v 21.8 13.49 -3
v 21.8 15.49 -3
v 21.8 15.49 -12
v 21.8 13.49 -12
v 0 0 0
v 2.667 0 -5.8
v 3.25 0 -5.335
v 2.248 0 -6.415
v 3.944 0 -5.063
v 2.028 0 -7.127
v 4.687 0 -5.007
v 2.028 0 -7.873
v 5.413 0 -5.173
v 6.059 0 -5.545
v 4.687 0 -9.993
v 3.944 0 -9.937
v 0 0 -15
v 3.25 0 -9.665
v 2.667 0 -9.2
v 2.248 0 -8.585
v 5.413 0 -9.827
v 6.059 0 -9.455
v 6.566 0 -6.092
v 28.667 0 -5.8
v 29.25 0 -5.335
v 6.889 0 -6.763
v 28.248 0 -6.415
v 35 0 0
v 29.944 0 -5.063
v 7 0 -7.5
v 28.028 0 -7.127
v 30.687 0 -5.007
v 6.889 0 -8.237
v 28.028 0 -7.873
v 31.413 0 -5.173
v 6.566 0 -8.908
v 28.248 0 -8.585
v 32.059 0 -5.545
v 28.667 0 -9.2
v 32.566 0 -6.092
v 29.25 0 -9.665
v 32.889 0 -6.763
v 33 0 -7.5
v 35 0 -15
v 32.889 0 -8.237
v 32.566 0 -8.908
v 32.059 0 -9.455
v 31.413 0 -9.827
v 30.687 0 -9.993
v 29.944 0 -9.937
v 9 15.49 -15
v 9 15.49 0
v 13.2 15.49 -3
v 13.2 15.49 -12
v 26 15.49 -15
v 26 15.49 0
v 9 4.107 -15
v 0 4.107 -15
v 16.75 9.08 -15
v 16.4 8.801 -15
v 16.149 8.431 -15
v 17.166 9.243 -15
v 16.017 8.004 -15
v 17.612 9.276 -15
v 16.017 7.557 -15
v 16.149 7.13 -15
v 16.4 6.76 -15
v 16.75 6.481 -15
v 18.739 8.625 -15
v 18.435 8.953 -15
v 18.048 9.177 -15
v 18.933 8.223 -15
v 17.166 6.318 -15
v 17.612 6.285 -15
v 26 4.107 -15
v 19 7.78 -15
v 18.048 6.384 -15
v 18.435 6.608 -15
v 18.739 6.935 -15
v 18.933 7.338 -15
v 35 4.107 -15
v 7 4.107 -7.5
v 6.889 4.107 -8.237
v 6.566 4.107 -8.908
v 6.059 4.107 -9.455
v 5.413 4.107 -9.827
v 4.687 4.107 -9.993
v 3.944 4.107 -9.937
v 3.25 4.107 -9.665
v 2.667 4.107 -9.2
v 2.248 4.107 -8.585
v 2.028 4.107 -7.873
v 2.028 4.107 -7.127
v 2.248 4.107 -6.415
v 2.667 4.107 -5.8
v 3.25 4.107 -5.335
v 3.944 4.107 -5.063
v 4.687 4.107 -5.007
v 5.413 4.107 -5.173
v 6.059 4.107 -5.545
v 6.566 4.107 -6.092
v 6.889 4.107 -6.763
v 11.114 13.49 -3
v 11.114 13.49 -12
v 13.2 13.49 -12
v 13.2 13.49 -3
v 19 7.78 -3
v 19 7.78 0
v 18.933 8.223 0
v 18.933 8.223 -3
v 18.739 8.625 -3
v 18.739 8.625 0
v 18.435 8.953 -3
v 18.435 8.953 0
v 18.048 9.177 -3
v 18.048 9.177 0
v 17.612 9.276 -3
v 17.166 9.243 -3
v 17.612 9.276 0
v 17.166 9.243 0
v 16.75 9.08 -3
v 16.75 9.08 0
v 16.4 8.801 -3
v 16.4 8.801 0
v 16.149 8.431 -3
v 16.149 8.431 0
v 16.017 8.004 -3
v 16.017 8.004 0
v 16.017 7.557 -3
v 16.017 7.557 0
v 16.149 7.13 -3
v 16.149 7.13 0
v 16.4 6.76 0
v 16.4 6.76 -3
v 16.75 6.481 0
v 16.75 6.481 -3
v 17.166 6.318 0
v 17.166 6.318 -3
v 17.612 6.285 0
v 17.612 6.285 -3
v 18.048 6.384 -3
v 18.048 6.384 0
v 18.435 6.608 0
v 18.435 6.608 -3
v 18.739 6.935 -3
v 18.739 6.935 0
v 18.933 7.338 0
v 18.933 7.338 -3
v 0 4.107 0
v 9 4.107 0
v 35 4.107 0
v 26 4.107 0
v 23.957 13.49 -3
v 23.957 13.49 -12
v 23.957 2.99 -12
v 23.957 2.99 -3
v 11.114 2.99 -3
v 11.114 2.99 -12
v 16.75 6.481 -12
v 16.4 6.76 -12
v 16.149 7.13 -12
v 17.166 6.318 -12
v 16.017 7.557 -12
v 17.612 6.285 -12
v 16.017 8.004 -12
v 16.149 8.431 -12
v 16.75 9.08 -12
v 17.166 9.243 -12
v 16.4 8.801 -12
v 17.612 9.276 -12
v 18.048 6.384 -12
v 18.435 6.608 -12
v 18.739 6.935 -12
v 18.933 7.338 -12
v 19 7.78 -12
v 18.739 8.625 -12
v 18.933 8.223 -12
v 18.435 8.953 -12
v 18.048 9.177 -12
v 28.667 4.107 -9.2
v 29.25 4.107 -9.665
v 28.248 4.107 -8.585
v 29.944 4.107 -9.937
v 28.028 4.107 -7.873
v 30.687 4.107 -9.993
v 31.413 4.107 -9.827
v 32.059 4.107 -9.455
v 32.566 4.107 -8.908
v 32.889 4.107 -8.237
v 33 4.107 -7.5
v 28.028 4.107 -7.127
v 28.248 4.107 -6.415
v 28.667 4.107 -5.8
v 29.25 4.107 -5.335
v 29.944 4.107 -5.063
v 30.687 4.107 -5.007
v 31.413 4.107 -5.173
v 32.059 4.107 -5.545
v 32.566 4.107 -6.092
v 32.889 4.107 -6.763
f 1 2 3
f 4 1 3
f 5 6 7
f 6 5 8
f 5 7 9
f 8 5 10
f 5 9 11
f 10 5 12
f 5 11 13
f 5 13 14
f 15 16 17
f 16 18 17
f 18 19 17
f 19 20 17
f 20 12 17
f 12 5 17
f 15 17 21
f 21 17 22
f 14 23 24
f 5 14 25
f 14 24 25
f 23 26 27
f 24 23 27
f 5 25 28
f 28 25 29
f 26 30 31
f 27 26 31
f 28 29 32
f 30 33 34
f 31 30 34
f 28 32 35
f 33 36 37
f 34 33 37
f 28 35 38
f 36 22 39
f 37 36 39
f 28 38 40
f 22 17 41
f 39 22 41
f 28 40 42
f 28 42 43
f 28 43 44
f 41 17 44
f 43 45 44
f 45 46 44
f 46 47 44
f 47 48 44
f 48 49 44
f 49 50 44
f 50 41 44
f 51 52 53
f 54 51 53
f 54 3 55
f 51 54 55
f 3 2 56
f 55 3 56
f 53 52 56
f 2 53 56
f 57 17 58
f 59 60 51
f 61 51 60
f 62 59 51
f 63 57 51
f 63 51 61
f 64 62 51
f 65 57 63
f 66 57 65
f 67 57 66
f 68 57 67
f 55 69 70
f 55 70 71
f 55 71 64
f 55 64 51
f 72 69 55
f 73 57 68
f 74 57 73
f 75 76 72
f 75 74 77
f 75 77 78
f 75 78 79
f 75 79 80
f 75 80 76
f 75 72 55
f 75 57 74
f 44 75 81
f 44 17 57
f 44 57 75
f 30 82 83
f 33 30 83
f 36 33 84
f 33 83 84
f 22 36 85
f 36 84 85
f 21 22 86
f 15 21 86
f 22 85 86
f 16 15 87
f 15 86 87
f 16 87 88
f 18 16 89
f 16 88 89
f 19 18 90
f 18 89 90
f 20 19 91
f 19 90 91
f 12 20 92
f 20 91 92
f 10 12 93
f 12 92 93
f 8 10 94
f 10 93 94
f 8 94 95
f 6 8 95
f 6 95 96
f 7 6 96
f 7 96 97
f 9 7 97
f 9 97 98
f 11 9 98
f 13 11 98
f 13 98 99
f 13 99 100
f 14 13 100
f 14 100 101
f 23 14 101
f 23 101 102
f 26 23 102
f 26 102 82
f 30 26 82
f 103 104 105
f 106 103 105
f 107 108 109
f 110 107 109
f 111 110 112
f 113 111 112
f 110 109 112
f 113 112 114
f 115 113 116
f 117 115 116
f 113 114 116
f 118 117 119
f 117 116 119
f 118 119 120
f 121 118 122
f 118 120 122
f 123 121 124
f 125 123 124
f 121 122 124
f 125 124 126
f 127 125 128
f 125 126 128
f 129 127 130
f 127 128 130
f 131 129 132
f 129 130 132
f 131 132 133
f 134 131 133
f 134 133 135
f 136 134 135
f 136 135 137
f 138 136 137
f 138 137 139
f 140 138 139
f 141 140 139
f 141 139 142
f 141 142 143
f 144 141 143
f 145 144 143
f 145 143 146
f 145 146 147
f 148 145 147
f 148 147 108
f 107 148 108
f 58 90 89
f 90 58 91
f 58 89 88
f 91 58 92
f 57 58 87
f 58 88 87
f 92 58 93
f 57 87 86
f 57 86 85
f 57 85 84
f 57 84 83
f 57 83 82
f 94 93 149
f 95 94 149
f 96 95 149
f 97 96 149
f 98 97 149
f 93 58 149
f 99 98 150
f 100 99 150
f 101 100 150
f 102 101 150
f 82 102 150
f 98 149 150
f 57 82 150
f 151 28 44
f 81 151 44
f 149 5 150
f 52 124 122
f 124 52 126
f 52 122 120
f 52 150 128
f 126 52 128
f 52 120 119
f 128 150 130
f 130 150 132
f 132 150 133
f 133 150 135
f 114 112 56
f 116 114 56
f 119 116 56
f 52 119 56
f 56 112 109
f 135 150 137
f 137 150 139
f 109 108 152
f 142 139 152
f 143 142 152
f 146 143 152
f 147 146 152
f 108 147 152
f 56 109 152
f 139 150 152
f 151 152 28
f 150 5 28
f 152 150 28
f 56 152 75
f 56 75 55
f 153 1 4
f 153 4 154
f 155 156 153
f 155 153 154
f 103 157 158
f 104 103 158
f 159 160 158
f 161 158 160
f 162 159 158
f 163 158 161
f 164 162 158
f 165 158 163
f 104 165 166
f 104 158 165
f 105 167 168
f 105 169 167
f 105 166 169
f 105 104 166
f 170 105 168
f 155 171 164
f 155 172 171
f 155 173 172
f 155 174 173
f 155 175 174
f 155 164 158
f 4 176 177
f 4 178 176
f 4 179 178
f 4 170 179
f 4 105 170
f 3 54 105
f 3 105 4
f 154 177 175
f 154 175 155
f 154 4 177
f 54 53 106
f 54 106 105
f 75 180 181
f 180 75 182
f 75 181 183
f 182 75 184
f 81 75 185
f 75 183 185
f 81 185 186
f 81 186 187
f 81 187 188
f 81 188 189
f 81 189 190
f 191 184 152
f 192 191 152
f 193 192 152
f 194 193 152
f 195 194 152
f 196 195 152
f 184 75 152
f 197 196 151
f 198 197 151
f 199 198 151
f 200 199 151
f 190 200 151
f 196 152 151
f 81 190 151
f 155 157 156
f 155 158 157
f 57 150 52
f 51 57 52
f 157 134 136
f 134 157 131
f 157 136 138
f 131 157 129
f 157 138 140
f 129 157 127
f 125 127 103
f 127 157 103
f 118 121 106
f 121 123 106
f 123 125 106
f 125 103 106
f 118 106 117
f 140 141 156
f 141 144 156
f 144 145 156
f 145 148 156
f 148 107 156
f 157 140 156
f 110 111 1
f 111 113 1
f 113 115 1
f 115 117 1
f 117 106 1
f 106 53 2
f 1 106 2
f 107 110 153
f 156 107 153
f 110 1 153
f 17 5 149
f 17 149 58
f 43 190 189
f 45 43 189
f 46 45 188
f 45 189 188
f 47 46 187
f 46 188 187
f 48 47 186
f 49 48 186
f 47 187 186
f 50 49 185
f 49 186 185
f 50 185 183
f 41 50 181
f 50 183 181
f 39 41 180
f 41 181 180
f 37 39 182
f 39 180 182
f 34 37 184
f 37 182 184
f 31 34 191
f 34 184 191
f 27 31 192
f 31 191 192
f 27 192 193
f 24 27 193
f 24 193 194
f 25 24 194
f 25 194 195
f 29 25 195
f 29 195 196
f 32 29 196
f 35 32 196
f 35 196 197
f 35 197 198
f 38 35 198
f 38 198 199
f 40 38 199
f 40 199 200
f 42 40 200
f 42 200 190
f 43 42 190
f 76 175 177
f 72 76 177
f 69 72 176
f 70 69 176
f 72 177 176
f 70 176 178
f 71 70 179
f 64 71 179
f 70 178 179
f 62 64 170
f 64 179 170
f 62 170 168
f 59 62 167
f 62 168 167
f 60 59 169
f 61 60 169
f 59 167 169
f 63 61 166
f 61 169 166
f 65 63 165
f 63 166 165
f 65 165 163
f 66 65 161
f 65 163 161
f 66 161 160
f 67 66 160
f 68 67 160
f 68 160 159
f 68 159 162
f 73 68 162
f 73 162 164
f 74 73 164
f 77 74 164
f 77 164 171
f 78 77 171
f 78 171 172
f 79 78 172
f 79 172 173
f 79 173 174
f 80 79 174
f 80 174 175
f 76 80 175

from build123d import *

# Parameters (mm, degrees)
SKETCH1_W           = 35
SKETCH1_H           = 15
BOSS_EXTRUDE1_DEPTH = 23.49
SKETCH2_W           = 22.56001237
SKETCH2_H           = 32.900224363
SKETCH2_W_2         = 23.005303498
CUT_EXTRUDE1_DEPTH  = 23.49
SKETCH3_W           = 17
SKETCH3_H           = 15.731554352
CUT_EXTRUDE2_DEPTH  = 23.49
SKETCH5_W           = 8.6
SKETCH5_H           = 9
CUT_EXTRUDE4_DEPTH  = 12.5
SKETCH8_W           = 12.842835289
SKETCH8_H           = 9
CUT_EXTRUDE5_DEPTH  = 10.5
SKETCH4_R           = 2.5
CUT_EXTRUDE6_DEPTH  = 5.107289171
SKETCH9_R           = 1.5
CUT_EXTRUDE7_DEPTH  = 16


with BuildPart() as part:
    # Sketch1 → Boss-Extrude1 (new body)
    with BuildSketch(Plane(origin=(0, 0, 0), x_dir=(1, 0, 0), z_dir=(0, 1, 0))):
        with Locations((17.5, 7.5)):
            Rectangle(SKETCH1_W, SKETCH1_H)
    extrude(amount=BOSS_EXTRUDE1_DEPTH)

    # Sketch2 → Cut-Extrude1 (cut)
    with BuildSketch(Plane.XY):
        with Locations((37.280006185, 20.557401353)):
            Rectangle(SKETCH2_W, SKETCH2_H)
        with Locations((-2.502651749, 20.557401353)):
            Rectangle(SKETCH2_W_2, SKETCH2_H)
    extrude(amount=-CUT_EXTRUDE1_DEPTH, mode=Mode.SUBTRACT)

    # Sketch3 → Cut-Extrude2 (cut)
    with BuildSketch(Plane.XY):
        with Locations((17.5, 23.355777176)):
            Rectangle(SKETCH3_W, SKETCH3_H)
    extrude(amount=-CUT_EXTRUDE2_DEPTH, mode=Mode.SUBTRACT)

    # Sketch5 → Cut-Extrude4 (cut)
    with BuildSketch(Plane(origin=(0, 15.49, 0), x_dir=(1, 0, 0), z_dir=(0, 1, 0))):
        with Locations((17.5, 7.5)):
            Rectangle(SKETCH5_W, SKETCH5_H)
    extrude(amount=-CUT_EXTRUDE4_DEPTH, mode=Mode.SUBTRACT)

    # Sketch8 → Cut-Extrude5 (cut)
    with BuildSketch(Plane(origin=(0, 2.99, 0), x_dir=(1, 0, 0), z_dir=(0, 1, 0))):
        with Locations((17.535477445, 7.5)):
            Rectangle(SKETCH8_W, SKETCH8_H)
    extrude(amount=CUT_EXTRUDE5_DEPTH, mode=Mode.SUBTRACT)

    # Sketch4 → Cut-Extrude6 (cut, through all)
    with BuildSketch(Plane(origin=(0, 4.107289171, 0), x_dir=(1, 0, 0), z_dir=(0, 1, 0))):
        with Locations((4.5, 7.5)):
            Circle(SKETCH4_R)
        with Locations((30.5, 7.5)):
            Circle(SKETCH4_R)
    extrude(amount=-CUT_EXTRUDE6_DEPTH, mode=Mode.SUBTRACT)

    # Sketch9 → Cut-Extrude7 (cut, through all)
    with BuildSketch(Plane.XY):
        with Locations((17.5, 7.780477446)):
            Circle(SKETCH9_R)
    extrude(amount=-CUT_EXTRUDE7_DEPTH, mode=Mode.SUBTRACT)


solid = part.part
